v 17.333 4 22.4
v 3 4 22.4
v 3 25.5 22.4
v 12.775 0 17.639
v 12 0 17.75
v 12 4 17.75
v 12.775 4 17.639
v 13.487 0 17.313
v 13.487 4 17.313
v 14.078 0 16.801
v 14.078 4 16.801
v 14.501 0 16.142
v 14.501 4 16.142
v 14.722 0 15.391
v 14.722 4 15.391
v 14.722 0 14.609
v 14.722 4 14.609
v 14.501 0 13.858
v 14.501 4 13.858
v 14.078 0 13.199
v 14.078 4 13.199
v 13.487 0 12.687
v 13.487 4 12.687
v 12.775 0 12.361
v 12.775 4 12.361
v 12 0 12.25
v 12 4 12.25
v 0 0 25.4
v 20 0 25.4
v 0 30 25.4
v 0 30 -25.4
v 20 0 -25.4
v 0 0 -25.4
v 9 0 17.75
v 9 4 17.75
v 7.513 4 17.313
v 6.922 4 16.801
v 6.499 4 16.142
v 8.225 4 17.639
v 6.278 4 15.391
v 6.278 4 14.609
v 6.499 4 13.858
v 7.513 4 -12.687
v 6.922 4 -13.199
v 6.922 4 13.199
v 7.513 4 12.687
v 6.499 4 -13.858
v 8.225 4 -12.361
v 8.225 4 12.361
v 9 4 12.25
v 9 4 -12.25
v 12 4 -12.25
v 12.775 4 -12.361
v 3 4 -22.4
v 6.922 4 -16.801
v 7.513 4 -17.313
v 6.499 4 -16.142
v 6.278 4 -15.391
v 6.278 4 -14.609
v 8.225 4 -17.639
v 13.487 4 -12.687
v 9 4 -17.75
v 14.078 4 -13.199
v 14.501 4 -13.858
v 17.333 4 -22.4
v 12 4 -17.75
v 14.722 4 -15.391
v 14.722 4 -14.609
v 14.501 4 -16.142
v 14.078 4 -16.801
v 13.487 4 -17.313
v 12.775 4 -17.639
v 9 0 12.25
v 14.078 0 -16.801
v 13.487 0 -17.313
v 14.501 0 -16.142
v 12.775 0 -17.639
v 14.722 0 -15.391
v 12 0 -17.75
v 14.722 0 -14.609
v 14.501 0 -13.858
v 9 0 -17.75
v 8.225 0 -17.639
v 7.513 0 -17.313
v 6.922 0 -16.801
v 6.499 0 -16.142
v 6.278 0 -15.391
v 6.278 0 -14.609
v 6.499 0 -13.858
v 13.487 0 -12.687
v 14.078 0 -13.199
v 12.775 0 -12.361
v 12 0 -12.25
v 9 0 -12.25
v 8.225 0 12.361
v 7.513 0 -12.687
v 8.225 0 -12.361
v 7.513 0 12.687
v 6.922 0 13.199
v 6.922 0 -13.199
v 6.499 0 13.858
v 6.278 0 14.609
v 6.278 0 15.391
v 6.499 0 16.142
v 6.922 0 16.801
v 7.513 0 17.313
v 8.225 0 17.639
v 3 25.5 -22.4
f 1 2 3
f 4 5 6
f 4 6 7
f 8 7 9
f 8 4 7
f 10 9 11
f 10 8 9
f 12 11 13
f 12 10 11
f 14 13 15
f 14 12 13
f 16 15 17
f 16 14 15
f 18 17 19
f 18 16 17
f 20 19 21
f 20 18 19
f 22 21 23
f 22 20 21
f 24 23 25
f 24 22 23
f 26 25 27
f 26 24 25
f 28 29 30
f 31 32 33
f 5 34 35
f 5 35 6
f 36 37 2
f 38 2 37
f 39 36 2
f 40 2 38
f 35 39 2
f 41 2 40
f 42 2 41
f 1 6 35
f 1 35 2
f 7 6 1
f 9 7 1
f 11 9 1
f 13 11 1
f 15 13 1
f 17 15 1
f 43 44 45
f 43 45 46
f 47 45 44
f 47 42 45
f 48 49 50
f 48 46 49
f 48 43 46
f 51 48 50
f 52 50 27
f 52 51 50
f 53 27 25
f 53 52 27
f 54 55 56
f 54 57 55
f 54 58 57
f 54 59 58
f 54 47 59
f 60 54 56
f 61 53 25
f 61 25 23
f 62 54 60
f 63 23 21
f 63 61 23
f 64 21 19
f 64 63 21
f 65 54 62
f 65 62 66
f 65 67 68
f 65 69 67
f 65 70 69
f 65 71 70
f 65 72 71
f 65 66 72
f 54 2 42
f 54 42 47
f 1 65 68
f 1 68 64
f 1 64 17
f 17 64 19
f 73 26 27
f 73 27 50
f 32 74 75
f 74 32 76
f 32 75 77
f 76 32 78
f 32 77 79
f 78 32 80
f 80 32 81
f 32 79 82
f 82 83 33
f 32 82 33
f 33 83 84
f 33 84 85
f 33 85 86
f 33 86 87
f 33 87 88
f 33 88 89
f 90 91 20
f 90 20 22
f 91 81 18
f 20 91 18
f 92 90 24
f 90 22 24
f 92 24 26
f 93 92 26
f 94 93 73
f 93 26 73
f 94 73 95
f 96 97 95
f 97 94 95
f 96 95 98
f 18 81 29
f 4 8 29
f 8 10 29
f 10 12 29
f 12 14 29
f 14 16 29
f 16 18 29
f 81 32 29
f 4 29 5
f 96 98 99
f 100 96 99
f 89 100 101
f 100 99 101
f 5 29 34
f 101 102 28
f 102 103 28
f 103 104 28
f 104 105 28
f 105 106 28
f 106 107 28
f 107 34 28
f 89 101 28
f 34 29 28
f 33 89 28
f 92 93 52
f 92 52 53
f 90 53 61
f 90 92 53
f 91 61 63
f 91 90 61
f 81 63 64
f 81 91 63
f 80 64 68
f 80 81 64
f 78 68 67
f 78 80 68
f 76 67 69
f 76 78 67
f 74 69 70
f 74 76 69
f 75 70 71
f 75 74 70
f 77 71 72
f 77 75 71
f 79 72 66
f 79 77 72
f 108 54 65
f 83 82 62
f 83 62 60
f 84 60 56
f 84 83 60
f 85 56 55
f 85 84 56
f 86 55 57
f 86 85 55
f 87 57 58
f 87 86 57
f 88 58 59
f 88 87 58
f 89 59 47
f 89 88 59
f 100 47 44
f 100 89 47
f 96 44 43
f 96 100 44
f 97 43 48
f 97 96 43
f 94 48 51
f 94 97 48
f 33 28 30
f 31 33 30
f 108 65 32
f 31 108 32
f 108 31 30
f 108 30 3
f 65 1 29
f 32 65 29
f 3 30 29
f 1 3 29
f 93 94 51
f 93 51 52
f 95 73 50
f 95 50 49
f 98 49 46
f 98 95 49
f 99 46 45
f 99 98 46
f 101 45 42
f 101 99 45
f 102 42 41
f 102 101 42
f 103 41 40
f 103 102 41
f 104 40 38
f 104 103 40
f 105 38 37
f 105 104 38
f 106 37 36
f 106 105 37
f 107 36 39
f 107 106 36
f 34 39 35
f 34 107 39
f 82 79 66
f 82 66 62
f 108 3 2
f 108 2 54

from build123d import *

# Parameters (mm, degrees)
BOSS_EXTRUDE1_DEPTH      = 25.4
SKETCH3_W                = 17
SKETCH3_H                = 44.8
CUT_EXTRUDE1_DEPTH       = 26
M5_CLEARANCE_SLOT1_DEPTH = 4


# Read off the part's stored shape, not the designer's step: M5 Clearance Slot1
with BuildPart() as part:
    # Sketch2 → Boss-Extrude1 (new, symmetric)
    with BuildSketch(Plane.XY):
        Polygon((0, 0), (0, 30), (20, 0), align=None)
    extrude(amount=BOSS_EXTRUDE1_DEPTH, both=True)

    # Sketch3 → Cut-Extrude1 (cut)
    with BuildSketch(Plane(origin=(0, 30, 0), x_dir=(1, 0, 0), z_dir=(0, 1, 0))):
        with Locations((11.5, 0)):
            Rectangle(SKETCH3_W, SKETCH3_H)
    extrude(amount=-CUT_EXTRUDE1_DEPTH, mode=Mode.SUBTRACT)

    # M5 Clearance Slot1 outline → M5 Clearance Slot1 (cut)
    with BuildSketch(Plane(origin=(0, 0, 0), x_dir=(1, 0, 0), z_dir=(0, 1, 0))):
        with BuildLine():
            Line((9, 12.25), (12, 12.25))
            ThreePointArc((12, 12.25), (14.75, 15), (12, 17.75))
            Line((12, 17.75), (9, 17.75))
            ThreePointArc((9, 17.75), (6.25, 15), (9, 12.25))
        make_face()
        with BuildLine():
            Line((9, -17.75), (12, -17.75))
            ThreePointArc((12, -17.75), (14.75, -15), (12, -12.25))
            Line((12, -12.25), (9, -12.25))
            ThreePointArc((9, -12.25), (6.25, -15), (9, -17.75))
        make_face()
    extrude(amount=M5_CLEARANCE_SLOT1_DEPTH, mode=Mode.SUBTRACT)


solid = part.part
